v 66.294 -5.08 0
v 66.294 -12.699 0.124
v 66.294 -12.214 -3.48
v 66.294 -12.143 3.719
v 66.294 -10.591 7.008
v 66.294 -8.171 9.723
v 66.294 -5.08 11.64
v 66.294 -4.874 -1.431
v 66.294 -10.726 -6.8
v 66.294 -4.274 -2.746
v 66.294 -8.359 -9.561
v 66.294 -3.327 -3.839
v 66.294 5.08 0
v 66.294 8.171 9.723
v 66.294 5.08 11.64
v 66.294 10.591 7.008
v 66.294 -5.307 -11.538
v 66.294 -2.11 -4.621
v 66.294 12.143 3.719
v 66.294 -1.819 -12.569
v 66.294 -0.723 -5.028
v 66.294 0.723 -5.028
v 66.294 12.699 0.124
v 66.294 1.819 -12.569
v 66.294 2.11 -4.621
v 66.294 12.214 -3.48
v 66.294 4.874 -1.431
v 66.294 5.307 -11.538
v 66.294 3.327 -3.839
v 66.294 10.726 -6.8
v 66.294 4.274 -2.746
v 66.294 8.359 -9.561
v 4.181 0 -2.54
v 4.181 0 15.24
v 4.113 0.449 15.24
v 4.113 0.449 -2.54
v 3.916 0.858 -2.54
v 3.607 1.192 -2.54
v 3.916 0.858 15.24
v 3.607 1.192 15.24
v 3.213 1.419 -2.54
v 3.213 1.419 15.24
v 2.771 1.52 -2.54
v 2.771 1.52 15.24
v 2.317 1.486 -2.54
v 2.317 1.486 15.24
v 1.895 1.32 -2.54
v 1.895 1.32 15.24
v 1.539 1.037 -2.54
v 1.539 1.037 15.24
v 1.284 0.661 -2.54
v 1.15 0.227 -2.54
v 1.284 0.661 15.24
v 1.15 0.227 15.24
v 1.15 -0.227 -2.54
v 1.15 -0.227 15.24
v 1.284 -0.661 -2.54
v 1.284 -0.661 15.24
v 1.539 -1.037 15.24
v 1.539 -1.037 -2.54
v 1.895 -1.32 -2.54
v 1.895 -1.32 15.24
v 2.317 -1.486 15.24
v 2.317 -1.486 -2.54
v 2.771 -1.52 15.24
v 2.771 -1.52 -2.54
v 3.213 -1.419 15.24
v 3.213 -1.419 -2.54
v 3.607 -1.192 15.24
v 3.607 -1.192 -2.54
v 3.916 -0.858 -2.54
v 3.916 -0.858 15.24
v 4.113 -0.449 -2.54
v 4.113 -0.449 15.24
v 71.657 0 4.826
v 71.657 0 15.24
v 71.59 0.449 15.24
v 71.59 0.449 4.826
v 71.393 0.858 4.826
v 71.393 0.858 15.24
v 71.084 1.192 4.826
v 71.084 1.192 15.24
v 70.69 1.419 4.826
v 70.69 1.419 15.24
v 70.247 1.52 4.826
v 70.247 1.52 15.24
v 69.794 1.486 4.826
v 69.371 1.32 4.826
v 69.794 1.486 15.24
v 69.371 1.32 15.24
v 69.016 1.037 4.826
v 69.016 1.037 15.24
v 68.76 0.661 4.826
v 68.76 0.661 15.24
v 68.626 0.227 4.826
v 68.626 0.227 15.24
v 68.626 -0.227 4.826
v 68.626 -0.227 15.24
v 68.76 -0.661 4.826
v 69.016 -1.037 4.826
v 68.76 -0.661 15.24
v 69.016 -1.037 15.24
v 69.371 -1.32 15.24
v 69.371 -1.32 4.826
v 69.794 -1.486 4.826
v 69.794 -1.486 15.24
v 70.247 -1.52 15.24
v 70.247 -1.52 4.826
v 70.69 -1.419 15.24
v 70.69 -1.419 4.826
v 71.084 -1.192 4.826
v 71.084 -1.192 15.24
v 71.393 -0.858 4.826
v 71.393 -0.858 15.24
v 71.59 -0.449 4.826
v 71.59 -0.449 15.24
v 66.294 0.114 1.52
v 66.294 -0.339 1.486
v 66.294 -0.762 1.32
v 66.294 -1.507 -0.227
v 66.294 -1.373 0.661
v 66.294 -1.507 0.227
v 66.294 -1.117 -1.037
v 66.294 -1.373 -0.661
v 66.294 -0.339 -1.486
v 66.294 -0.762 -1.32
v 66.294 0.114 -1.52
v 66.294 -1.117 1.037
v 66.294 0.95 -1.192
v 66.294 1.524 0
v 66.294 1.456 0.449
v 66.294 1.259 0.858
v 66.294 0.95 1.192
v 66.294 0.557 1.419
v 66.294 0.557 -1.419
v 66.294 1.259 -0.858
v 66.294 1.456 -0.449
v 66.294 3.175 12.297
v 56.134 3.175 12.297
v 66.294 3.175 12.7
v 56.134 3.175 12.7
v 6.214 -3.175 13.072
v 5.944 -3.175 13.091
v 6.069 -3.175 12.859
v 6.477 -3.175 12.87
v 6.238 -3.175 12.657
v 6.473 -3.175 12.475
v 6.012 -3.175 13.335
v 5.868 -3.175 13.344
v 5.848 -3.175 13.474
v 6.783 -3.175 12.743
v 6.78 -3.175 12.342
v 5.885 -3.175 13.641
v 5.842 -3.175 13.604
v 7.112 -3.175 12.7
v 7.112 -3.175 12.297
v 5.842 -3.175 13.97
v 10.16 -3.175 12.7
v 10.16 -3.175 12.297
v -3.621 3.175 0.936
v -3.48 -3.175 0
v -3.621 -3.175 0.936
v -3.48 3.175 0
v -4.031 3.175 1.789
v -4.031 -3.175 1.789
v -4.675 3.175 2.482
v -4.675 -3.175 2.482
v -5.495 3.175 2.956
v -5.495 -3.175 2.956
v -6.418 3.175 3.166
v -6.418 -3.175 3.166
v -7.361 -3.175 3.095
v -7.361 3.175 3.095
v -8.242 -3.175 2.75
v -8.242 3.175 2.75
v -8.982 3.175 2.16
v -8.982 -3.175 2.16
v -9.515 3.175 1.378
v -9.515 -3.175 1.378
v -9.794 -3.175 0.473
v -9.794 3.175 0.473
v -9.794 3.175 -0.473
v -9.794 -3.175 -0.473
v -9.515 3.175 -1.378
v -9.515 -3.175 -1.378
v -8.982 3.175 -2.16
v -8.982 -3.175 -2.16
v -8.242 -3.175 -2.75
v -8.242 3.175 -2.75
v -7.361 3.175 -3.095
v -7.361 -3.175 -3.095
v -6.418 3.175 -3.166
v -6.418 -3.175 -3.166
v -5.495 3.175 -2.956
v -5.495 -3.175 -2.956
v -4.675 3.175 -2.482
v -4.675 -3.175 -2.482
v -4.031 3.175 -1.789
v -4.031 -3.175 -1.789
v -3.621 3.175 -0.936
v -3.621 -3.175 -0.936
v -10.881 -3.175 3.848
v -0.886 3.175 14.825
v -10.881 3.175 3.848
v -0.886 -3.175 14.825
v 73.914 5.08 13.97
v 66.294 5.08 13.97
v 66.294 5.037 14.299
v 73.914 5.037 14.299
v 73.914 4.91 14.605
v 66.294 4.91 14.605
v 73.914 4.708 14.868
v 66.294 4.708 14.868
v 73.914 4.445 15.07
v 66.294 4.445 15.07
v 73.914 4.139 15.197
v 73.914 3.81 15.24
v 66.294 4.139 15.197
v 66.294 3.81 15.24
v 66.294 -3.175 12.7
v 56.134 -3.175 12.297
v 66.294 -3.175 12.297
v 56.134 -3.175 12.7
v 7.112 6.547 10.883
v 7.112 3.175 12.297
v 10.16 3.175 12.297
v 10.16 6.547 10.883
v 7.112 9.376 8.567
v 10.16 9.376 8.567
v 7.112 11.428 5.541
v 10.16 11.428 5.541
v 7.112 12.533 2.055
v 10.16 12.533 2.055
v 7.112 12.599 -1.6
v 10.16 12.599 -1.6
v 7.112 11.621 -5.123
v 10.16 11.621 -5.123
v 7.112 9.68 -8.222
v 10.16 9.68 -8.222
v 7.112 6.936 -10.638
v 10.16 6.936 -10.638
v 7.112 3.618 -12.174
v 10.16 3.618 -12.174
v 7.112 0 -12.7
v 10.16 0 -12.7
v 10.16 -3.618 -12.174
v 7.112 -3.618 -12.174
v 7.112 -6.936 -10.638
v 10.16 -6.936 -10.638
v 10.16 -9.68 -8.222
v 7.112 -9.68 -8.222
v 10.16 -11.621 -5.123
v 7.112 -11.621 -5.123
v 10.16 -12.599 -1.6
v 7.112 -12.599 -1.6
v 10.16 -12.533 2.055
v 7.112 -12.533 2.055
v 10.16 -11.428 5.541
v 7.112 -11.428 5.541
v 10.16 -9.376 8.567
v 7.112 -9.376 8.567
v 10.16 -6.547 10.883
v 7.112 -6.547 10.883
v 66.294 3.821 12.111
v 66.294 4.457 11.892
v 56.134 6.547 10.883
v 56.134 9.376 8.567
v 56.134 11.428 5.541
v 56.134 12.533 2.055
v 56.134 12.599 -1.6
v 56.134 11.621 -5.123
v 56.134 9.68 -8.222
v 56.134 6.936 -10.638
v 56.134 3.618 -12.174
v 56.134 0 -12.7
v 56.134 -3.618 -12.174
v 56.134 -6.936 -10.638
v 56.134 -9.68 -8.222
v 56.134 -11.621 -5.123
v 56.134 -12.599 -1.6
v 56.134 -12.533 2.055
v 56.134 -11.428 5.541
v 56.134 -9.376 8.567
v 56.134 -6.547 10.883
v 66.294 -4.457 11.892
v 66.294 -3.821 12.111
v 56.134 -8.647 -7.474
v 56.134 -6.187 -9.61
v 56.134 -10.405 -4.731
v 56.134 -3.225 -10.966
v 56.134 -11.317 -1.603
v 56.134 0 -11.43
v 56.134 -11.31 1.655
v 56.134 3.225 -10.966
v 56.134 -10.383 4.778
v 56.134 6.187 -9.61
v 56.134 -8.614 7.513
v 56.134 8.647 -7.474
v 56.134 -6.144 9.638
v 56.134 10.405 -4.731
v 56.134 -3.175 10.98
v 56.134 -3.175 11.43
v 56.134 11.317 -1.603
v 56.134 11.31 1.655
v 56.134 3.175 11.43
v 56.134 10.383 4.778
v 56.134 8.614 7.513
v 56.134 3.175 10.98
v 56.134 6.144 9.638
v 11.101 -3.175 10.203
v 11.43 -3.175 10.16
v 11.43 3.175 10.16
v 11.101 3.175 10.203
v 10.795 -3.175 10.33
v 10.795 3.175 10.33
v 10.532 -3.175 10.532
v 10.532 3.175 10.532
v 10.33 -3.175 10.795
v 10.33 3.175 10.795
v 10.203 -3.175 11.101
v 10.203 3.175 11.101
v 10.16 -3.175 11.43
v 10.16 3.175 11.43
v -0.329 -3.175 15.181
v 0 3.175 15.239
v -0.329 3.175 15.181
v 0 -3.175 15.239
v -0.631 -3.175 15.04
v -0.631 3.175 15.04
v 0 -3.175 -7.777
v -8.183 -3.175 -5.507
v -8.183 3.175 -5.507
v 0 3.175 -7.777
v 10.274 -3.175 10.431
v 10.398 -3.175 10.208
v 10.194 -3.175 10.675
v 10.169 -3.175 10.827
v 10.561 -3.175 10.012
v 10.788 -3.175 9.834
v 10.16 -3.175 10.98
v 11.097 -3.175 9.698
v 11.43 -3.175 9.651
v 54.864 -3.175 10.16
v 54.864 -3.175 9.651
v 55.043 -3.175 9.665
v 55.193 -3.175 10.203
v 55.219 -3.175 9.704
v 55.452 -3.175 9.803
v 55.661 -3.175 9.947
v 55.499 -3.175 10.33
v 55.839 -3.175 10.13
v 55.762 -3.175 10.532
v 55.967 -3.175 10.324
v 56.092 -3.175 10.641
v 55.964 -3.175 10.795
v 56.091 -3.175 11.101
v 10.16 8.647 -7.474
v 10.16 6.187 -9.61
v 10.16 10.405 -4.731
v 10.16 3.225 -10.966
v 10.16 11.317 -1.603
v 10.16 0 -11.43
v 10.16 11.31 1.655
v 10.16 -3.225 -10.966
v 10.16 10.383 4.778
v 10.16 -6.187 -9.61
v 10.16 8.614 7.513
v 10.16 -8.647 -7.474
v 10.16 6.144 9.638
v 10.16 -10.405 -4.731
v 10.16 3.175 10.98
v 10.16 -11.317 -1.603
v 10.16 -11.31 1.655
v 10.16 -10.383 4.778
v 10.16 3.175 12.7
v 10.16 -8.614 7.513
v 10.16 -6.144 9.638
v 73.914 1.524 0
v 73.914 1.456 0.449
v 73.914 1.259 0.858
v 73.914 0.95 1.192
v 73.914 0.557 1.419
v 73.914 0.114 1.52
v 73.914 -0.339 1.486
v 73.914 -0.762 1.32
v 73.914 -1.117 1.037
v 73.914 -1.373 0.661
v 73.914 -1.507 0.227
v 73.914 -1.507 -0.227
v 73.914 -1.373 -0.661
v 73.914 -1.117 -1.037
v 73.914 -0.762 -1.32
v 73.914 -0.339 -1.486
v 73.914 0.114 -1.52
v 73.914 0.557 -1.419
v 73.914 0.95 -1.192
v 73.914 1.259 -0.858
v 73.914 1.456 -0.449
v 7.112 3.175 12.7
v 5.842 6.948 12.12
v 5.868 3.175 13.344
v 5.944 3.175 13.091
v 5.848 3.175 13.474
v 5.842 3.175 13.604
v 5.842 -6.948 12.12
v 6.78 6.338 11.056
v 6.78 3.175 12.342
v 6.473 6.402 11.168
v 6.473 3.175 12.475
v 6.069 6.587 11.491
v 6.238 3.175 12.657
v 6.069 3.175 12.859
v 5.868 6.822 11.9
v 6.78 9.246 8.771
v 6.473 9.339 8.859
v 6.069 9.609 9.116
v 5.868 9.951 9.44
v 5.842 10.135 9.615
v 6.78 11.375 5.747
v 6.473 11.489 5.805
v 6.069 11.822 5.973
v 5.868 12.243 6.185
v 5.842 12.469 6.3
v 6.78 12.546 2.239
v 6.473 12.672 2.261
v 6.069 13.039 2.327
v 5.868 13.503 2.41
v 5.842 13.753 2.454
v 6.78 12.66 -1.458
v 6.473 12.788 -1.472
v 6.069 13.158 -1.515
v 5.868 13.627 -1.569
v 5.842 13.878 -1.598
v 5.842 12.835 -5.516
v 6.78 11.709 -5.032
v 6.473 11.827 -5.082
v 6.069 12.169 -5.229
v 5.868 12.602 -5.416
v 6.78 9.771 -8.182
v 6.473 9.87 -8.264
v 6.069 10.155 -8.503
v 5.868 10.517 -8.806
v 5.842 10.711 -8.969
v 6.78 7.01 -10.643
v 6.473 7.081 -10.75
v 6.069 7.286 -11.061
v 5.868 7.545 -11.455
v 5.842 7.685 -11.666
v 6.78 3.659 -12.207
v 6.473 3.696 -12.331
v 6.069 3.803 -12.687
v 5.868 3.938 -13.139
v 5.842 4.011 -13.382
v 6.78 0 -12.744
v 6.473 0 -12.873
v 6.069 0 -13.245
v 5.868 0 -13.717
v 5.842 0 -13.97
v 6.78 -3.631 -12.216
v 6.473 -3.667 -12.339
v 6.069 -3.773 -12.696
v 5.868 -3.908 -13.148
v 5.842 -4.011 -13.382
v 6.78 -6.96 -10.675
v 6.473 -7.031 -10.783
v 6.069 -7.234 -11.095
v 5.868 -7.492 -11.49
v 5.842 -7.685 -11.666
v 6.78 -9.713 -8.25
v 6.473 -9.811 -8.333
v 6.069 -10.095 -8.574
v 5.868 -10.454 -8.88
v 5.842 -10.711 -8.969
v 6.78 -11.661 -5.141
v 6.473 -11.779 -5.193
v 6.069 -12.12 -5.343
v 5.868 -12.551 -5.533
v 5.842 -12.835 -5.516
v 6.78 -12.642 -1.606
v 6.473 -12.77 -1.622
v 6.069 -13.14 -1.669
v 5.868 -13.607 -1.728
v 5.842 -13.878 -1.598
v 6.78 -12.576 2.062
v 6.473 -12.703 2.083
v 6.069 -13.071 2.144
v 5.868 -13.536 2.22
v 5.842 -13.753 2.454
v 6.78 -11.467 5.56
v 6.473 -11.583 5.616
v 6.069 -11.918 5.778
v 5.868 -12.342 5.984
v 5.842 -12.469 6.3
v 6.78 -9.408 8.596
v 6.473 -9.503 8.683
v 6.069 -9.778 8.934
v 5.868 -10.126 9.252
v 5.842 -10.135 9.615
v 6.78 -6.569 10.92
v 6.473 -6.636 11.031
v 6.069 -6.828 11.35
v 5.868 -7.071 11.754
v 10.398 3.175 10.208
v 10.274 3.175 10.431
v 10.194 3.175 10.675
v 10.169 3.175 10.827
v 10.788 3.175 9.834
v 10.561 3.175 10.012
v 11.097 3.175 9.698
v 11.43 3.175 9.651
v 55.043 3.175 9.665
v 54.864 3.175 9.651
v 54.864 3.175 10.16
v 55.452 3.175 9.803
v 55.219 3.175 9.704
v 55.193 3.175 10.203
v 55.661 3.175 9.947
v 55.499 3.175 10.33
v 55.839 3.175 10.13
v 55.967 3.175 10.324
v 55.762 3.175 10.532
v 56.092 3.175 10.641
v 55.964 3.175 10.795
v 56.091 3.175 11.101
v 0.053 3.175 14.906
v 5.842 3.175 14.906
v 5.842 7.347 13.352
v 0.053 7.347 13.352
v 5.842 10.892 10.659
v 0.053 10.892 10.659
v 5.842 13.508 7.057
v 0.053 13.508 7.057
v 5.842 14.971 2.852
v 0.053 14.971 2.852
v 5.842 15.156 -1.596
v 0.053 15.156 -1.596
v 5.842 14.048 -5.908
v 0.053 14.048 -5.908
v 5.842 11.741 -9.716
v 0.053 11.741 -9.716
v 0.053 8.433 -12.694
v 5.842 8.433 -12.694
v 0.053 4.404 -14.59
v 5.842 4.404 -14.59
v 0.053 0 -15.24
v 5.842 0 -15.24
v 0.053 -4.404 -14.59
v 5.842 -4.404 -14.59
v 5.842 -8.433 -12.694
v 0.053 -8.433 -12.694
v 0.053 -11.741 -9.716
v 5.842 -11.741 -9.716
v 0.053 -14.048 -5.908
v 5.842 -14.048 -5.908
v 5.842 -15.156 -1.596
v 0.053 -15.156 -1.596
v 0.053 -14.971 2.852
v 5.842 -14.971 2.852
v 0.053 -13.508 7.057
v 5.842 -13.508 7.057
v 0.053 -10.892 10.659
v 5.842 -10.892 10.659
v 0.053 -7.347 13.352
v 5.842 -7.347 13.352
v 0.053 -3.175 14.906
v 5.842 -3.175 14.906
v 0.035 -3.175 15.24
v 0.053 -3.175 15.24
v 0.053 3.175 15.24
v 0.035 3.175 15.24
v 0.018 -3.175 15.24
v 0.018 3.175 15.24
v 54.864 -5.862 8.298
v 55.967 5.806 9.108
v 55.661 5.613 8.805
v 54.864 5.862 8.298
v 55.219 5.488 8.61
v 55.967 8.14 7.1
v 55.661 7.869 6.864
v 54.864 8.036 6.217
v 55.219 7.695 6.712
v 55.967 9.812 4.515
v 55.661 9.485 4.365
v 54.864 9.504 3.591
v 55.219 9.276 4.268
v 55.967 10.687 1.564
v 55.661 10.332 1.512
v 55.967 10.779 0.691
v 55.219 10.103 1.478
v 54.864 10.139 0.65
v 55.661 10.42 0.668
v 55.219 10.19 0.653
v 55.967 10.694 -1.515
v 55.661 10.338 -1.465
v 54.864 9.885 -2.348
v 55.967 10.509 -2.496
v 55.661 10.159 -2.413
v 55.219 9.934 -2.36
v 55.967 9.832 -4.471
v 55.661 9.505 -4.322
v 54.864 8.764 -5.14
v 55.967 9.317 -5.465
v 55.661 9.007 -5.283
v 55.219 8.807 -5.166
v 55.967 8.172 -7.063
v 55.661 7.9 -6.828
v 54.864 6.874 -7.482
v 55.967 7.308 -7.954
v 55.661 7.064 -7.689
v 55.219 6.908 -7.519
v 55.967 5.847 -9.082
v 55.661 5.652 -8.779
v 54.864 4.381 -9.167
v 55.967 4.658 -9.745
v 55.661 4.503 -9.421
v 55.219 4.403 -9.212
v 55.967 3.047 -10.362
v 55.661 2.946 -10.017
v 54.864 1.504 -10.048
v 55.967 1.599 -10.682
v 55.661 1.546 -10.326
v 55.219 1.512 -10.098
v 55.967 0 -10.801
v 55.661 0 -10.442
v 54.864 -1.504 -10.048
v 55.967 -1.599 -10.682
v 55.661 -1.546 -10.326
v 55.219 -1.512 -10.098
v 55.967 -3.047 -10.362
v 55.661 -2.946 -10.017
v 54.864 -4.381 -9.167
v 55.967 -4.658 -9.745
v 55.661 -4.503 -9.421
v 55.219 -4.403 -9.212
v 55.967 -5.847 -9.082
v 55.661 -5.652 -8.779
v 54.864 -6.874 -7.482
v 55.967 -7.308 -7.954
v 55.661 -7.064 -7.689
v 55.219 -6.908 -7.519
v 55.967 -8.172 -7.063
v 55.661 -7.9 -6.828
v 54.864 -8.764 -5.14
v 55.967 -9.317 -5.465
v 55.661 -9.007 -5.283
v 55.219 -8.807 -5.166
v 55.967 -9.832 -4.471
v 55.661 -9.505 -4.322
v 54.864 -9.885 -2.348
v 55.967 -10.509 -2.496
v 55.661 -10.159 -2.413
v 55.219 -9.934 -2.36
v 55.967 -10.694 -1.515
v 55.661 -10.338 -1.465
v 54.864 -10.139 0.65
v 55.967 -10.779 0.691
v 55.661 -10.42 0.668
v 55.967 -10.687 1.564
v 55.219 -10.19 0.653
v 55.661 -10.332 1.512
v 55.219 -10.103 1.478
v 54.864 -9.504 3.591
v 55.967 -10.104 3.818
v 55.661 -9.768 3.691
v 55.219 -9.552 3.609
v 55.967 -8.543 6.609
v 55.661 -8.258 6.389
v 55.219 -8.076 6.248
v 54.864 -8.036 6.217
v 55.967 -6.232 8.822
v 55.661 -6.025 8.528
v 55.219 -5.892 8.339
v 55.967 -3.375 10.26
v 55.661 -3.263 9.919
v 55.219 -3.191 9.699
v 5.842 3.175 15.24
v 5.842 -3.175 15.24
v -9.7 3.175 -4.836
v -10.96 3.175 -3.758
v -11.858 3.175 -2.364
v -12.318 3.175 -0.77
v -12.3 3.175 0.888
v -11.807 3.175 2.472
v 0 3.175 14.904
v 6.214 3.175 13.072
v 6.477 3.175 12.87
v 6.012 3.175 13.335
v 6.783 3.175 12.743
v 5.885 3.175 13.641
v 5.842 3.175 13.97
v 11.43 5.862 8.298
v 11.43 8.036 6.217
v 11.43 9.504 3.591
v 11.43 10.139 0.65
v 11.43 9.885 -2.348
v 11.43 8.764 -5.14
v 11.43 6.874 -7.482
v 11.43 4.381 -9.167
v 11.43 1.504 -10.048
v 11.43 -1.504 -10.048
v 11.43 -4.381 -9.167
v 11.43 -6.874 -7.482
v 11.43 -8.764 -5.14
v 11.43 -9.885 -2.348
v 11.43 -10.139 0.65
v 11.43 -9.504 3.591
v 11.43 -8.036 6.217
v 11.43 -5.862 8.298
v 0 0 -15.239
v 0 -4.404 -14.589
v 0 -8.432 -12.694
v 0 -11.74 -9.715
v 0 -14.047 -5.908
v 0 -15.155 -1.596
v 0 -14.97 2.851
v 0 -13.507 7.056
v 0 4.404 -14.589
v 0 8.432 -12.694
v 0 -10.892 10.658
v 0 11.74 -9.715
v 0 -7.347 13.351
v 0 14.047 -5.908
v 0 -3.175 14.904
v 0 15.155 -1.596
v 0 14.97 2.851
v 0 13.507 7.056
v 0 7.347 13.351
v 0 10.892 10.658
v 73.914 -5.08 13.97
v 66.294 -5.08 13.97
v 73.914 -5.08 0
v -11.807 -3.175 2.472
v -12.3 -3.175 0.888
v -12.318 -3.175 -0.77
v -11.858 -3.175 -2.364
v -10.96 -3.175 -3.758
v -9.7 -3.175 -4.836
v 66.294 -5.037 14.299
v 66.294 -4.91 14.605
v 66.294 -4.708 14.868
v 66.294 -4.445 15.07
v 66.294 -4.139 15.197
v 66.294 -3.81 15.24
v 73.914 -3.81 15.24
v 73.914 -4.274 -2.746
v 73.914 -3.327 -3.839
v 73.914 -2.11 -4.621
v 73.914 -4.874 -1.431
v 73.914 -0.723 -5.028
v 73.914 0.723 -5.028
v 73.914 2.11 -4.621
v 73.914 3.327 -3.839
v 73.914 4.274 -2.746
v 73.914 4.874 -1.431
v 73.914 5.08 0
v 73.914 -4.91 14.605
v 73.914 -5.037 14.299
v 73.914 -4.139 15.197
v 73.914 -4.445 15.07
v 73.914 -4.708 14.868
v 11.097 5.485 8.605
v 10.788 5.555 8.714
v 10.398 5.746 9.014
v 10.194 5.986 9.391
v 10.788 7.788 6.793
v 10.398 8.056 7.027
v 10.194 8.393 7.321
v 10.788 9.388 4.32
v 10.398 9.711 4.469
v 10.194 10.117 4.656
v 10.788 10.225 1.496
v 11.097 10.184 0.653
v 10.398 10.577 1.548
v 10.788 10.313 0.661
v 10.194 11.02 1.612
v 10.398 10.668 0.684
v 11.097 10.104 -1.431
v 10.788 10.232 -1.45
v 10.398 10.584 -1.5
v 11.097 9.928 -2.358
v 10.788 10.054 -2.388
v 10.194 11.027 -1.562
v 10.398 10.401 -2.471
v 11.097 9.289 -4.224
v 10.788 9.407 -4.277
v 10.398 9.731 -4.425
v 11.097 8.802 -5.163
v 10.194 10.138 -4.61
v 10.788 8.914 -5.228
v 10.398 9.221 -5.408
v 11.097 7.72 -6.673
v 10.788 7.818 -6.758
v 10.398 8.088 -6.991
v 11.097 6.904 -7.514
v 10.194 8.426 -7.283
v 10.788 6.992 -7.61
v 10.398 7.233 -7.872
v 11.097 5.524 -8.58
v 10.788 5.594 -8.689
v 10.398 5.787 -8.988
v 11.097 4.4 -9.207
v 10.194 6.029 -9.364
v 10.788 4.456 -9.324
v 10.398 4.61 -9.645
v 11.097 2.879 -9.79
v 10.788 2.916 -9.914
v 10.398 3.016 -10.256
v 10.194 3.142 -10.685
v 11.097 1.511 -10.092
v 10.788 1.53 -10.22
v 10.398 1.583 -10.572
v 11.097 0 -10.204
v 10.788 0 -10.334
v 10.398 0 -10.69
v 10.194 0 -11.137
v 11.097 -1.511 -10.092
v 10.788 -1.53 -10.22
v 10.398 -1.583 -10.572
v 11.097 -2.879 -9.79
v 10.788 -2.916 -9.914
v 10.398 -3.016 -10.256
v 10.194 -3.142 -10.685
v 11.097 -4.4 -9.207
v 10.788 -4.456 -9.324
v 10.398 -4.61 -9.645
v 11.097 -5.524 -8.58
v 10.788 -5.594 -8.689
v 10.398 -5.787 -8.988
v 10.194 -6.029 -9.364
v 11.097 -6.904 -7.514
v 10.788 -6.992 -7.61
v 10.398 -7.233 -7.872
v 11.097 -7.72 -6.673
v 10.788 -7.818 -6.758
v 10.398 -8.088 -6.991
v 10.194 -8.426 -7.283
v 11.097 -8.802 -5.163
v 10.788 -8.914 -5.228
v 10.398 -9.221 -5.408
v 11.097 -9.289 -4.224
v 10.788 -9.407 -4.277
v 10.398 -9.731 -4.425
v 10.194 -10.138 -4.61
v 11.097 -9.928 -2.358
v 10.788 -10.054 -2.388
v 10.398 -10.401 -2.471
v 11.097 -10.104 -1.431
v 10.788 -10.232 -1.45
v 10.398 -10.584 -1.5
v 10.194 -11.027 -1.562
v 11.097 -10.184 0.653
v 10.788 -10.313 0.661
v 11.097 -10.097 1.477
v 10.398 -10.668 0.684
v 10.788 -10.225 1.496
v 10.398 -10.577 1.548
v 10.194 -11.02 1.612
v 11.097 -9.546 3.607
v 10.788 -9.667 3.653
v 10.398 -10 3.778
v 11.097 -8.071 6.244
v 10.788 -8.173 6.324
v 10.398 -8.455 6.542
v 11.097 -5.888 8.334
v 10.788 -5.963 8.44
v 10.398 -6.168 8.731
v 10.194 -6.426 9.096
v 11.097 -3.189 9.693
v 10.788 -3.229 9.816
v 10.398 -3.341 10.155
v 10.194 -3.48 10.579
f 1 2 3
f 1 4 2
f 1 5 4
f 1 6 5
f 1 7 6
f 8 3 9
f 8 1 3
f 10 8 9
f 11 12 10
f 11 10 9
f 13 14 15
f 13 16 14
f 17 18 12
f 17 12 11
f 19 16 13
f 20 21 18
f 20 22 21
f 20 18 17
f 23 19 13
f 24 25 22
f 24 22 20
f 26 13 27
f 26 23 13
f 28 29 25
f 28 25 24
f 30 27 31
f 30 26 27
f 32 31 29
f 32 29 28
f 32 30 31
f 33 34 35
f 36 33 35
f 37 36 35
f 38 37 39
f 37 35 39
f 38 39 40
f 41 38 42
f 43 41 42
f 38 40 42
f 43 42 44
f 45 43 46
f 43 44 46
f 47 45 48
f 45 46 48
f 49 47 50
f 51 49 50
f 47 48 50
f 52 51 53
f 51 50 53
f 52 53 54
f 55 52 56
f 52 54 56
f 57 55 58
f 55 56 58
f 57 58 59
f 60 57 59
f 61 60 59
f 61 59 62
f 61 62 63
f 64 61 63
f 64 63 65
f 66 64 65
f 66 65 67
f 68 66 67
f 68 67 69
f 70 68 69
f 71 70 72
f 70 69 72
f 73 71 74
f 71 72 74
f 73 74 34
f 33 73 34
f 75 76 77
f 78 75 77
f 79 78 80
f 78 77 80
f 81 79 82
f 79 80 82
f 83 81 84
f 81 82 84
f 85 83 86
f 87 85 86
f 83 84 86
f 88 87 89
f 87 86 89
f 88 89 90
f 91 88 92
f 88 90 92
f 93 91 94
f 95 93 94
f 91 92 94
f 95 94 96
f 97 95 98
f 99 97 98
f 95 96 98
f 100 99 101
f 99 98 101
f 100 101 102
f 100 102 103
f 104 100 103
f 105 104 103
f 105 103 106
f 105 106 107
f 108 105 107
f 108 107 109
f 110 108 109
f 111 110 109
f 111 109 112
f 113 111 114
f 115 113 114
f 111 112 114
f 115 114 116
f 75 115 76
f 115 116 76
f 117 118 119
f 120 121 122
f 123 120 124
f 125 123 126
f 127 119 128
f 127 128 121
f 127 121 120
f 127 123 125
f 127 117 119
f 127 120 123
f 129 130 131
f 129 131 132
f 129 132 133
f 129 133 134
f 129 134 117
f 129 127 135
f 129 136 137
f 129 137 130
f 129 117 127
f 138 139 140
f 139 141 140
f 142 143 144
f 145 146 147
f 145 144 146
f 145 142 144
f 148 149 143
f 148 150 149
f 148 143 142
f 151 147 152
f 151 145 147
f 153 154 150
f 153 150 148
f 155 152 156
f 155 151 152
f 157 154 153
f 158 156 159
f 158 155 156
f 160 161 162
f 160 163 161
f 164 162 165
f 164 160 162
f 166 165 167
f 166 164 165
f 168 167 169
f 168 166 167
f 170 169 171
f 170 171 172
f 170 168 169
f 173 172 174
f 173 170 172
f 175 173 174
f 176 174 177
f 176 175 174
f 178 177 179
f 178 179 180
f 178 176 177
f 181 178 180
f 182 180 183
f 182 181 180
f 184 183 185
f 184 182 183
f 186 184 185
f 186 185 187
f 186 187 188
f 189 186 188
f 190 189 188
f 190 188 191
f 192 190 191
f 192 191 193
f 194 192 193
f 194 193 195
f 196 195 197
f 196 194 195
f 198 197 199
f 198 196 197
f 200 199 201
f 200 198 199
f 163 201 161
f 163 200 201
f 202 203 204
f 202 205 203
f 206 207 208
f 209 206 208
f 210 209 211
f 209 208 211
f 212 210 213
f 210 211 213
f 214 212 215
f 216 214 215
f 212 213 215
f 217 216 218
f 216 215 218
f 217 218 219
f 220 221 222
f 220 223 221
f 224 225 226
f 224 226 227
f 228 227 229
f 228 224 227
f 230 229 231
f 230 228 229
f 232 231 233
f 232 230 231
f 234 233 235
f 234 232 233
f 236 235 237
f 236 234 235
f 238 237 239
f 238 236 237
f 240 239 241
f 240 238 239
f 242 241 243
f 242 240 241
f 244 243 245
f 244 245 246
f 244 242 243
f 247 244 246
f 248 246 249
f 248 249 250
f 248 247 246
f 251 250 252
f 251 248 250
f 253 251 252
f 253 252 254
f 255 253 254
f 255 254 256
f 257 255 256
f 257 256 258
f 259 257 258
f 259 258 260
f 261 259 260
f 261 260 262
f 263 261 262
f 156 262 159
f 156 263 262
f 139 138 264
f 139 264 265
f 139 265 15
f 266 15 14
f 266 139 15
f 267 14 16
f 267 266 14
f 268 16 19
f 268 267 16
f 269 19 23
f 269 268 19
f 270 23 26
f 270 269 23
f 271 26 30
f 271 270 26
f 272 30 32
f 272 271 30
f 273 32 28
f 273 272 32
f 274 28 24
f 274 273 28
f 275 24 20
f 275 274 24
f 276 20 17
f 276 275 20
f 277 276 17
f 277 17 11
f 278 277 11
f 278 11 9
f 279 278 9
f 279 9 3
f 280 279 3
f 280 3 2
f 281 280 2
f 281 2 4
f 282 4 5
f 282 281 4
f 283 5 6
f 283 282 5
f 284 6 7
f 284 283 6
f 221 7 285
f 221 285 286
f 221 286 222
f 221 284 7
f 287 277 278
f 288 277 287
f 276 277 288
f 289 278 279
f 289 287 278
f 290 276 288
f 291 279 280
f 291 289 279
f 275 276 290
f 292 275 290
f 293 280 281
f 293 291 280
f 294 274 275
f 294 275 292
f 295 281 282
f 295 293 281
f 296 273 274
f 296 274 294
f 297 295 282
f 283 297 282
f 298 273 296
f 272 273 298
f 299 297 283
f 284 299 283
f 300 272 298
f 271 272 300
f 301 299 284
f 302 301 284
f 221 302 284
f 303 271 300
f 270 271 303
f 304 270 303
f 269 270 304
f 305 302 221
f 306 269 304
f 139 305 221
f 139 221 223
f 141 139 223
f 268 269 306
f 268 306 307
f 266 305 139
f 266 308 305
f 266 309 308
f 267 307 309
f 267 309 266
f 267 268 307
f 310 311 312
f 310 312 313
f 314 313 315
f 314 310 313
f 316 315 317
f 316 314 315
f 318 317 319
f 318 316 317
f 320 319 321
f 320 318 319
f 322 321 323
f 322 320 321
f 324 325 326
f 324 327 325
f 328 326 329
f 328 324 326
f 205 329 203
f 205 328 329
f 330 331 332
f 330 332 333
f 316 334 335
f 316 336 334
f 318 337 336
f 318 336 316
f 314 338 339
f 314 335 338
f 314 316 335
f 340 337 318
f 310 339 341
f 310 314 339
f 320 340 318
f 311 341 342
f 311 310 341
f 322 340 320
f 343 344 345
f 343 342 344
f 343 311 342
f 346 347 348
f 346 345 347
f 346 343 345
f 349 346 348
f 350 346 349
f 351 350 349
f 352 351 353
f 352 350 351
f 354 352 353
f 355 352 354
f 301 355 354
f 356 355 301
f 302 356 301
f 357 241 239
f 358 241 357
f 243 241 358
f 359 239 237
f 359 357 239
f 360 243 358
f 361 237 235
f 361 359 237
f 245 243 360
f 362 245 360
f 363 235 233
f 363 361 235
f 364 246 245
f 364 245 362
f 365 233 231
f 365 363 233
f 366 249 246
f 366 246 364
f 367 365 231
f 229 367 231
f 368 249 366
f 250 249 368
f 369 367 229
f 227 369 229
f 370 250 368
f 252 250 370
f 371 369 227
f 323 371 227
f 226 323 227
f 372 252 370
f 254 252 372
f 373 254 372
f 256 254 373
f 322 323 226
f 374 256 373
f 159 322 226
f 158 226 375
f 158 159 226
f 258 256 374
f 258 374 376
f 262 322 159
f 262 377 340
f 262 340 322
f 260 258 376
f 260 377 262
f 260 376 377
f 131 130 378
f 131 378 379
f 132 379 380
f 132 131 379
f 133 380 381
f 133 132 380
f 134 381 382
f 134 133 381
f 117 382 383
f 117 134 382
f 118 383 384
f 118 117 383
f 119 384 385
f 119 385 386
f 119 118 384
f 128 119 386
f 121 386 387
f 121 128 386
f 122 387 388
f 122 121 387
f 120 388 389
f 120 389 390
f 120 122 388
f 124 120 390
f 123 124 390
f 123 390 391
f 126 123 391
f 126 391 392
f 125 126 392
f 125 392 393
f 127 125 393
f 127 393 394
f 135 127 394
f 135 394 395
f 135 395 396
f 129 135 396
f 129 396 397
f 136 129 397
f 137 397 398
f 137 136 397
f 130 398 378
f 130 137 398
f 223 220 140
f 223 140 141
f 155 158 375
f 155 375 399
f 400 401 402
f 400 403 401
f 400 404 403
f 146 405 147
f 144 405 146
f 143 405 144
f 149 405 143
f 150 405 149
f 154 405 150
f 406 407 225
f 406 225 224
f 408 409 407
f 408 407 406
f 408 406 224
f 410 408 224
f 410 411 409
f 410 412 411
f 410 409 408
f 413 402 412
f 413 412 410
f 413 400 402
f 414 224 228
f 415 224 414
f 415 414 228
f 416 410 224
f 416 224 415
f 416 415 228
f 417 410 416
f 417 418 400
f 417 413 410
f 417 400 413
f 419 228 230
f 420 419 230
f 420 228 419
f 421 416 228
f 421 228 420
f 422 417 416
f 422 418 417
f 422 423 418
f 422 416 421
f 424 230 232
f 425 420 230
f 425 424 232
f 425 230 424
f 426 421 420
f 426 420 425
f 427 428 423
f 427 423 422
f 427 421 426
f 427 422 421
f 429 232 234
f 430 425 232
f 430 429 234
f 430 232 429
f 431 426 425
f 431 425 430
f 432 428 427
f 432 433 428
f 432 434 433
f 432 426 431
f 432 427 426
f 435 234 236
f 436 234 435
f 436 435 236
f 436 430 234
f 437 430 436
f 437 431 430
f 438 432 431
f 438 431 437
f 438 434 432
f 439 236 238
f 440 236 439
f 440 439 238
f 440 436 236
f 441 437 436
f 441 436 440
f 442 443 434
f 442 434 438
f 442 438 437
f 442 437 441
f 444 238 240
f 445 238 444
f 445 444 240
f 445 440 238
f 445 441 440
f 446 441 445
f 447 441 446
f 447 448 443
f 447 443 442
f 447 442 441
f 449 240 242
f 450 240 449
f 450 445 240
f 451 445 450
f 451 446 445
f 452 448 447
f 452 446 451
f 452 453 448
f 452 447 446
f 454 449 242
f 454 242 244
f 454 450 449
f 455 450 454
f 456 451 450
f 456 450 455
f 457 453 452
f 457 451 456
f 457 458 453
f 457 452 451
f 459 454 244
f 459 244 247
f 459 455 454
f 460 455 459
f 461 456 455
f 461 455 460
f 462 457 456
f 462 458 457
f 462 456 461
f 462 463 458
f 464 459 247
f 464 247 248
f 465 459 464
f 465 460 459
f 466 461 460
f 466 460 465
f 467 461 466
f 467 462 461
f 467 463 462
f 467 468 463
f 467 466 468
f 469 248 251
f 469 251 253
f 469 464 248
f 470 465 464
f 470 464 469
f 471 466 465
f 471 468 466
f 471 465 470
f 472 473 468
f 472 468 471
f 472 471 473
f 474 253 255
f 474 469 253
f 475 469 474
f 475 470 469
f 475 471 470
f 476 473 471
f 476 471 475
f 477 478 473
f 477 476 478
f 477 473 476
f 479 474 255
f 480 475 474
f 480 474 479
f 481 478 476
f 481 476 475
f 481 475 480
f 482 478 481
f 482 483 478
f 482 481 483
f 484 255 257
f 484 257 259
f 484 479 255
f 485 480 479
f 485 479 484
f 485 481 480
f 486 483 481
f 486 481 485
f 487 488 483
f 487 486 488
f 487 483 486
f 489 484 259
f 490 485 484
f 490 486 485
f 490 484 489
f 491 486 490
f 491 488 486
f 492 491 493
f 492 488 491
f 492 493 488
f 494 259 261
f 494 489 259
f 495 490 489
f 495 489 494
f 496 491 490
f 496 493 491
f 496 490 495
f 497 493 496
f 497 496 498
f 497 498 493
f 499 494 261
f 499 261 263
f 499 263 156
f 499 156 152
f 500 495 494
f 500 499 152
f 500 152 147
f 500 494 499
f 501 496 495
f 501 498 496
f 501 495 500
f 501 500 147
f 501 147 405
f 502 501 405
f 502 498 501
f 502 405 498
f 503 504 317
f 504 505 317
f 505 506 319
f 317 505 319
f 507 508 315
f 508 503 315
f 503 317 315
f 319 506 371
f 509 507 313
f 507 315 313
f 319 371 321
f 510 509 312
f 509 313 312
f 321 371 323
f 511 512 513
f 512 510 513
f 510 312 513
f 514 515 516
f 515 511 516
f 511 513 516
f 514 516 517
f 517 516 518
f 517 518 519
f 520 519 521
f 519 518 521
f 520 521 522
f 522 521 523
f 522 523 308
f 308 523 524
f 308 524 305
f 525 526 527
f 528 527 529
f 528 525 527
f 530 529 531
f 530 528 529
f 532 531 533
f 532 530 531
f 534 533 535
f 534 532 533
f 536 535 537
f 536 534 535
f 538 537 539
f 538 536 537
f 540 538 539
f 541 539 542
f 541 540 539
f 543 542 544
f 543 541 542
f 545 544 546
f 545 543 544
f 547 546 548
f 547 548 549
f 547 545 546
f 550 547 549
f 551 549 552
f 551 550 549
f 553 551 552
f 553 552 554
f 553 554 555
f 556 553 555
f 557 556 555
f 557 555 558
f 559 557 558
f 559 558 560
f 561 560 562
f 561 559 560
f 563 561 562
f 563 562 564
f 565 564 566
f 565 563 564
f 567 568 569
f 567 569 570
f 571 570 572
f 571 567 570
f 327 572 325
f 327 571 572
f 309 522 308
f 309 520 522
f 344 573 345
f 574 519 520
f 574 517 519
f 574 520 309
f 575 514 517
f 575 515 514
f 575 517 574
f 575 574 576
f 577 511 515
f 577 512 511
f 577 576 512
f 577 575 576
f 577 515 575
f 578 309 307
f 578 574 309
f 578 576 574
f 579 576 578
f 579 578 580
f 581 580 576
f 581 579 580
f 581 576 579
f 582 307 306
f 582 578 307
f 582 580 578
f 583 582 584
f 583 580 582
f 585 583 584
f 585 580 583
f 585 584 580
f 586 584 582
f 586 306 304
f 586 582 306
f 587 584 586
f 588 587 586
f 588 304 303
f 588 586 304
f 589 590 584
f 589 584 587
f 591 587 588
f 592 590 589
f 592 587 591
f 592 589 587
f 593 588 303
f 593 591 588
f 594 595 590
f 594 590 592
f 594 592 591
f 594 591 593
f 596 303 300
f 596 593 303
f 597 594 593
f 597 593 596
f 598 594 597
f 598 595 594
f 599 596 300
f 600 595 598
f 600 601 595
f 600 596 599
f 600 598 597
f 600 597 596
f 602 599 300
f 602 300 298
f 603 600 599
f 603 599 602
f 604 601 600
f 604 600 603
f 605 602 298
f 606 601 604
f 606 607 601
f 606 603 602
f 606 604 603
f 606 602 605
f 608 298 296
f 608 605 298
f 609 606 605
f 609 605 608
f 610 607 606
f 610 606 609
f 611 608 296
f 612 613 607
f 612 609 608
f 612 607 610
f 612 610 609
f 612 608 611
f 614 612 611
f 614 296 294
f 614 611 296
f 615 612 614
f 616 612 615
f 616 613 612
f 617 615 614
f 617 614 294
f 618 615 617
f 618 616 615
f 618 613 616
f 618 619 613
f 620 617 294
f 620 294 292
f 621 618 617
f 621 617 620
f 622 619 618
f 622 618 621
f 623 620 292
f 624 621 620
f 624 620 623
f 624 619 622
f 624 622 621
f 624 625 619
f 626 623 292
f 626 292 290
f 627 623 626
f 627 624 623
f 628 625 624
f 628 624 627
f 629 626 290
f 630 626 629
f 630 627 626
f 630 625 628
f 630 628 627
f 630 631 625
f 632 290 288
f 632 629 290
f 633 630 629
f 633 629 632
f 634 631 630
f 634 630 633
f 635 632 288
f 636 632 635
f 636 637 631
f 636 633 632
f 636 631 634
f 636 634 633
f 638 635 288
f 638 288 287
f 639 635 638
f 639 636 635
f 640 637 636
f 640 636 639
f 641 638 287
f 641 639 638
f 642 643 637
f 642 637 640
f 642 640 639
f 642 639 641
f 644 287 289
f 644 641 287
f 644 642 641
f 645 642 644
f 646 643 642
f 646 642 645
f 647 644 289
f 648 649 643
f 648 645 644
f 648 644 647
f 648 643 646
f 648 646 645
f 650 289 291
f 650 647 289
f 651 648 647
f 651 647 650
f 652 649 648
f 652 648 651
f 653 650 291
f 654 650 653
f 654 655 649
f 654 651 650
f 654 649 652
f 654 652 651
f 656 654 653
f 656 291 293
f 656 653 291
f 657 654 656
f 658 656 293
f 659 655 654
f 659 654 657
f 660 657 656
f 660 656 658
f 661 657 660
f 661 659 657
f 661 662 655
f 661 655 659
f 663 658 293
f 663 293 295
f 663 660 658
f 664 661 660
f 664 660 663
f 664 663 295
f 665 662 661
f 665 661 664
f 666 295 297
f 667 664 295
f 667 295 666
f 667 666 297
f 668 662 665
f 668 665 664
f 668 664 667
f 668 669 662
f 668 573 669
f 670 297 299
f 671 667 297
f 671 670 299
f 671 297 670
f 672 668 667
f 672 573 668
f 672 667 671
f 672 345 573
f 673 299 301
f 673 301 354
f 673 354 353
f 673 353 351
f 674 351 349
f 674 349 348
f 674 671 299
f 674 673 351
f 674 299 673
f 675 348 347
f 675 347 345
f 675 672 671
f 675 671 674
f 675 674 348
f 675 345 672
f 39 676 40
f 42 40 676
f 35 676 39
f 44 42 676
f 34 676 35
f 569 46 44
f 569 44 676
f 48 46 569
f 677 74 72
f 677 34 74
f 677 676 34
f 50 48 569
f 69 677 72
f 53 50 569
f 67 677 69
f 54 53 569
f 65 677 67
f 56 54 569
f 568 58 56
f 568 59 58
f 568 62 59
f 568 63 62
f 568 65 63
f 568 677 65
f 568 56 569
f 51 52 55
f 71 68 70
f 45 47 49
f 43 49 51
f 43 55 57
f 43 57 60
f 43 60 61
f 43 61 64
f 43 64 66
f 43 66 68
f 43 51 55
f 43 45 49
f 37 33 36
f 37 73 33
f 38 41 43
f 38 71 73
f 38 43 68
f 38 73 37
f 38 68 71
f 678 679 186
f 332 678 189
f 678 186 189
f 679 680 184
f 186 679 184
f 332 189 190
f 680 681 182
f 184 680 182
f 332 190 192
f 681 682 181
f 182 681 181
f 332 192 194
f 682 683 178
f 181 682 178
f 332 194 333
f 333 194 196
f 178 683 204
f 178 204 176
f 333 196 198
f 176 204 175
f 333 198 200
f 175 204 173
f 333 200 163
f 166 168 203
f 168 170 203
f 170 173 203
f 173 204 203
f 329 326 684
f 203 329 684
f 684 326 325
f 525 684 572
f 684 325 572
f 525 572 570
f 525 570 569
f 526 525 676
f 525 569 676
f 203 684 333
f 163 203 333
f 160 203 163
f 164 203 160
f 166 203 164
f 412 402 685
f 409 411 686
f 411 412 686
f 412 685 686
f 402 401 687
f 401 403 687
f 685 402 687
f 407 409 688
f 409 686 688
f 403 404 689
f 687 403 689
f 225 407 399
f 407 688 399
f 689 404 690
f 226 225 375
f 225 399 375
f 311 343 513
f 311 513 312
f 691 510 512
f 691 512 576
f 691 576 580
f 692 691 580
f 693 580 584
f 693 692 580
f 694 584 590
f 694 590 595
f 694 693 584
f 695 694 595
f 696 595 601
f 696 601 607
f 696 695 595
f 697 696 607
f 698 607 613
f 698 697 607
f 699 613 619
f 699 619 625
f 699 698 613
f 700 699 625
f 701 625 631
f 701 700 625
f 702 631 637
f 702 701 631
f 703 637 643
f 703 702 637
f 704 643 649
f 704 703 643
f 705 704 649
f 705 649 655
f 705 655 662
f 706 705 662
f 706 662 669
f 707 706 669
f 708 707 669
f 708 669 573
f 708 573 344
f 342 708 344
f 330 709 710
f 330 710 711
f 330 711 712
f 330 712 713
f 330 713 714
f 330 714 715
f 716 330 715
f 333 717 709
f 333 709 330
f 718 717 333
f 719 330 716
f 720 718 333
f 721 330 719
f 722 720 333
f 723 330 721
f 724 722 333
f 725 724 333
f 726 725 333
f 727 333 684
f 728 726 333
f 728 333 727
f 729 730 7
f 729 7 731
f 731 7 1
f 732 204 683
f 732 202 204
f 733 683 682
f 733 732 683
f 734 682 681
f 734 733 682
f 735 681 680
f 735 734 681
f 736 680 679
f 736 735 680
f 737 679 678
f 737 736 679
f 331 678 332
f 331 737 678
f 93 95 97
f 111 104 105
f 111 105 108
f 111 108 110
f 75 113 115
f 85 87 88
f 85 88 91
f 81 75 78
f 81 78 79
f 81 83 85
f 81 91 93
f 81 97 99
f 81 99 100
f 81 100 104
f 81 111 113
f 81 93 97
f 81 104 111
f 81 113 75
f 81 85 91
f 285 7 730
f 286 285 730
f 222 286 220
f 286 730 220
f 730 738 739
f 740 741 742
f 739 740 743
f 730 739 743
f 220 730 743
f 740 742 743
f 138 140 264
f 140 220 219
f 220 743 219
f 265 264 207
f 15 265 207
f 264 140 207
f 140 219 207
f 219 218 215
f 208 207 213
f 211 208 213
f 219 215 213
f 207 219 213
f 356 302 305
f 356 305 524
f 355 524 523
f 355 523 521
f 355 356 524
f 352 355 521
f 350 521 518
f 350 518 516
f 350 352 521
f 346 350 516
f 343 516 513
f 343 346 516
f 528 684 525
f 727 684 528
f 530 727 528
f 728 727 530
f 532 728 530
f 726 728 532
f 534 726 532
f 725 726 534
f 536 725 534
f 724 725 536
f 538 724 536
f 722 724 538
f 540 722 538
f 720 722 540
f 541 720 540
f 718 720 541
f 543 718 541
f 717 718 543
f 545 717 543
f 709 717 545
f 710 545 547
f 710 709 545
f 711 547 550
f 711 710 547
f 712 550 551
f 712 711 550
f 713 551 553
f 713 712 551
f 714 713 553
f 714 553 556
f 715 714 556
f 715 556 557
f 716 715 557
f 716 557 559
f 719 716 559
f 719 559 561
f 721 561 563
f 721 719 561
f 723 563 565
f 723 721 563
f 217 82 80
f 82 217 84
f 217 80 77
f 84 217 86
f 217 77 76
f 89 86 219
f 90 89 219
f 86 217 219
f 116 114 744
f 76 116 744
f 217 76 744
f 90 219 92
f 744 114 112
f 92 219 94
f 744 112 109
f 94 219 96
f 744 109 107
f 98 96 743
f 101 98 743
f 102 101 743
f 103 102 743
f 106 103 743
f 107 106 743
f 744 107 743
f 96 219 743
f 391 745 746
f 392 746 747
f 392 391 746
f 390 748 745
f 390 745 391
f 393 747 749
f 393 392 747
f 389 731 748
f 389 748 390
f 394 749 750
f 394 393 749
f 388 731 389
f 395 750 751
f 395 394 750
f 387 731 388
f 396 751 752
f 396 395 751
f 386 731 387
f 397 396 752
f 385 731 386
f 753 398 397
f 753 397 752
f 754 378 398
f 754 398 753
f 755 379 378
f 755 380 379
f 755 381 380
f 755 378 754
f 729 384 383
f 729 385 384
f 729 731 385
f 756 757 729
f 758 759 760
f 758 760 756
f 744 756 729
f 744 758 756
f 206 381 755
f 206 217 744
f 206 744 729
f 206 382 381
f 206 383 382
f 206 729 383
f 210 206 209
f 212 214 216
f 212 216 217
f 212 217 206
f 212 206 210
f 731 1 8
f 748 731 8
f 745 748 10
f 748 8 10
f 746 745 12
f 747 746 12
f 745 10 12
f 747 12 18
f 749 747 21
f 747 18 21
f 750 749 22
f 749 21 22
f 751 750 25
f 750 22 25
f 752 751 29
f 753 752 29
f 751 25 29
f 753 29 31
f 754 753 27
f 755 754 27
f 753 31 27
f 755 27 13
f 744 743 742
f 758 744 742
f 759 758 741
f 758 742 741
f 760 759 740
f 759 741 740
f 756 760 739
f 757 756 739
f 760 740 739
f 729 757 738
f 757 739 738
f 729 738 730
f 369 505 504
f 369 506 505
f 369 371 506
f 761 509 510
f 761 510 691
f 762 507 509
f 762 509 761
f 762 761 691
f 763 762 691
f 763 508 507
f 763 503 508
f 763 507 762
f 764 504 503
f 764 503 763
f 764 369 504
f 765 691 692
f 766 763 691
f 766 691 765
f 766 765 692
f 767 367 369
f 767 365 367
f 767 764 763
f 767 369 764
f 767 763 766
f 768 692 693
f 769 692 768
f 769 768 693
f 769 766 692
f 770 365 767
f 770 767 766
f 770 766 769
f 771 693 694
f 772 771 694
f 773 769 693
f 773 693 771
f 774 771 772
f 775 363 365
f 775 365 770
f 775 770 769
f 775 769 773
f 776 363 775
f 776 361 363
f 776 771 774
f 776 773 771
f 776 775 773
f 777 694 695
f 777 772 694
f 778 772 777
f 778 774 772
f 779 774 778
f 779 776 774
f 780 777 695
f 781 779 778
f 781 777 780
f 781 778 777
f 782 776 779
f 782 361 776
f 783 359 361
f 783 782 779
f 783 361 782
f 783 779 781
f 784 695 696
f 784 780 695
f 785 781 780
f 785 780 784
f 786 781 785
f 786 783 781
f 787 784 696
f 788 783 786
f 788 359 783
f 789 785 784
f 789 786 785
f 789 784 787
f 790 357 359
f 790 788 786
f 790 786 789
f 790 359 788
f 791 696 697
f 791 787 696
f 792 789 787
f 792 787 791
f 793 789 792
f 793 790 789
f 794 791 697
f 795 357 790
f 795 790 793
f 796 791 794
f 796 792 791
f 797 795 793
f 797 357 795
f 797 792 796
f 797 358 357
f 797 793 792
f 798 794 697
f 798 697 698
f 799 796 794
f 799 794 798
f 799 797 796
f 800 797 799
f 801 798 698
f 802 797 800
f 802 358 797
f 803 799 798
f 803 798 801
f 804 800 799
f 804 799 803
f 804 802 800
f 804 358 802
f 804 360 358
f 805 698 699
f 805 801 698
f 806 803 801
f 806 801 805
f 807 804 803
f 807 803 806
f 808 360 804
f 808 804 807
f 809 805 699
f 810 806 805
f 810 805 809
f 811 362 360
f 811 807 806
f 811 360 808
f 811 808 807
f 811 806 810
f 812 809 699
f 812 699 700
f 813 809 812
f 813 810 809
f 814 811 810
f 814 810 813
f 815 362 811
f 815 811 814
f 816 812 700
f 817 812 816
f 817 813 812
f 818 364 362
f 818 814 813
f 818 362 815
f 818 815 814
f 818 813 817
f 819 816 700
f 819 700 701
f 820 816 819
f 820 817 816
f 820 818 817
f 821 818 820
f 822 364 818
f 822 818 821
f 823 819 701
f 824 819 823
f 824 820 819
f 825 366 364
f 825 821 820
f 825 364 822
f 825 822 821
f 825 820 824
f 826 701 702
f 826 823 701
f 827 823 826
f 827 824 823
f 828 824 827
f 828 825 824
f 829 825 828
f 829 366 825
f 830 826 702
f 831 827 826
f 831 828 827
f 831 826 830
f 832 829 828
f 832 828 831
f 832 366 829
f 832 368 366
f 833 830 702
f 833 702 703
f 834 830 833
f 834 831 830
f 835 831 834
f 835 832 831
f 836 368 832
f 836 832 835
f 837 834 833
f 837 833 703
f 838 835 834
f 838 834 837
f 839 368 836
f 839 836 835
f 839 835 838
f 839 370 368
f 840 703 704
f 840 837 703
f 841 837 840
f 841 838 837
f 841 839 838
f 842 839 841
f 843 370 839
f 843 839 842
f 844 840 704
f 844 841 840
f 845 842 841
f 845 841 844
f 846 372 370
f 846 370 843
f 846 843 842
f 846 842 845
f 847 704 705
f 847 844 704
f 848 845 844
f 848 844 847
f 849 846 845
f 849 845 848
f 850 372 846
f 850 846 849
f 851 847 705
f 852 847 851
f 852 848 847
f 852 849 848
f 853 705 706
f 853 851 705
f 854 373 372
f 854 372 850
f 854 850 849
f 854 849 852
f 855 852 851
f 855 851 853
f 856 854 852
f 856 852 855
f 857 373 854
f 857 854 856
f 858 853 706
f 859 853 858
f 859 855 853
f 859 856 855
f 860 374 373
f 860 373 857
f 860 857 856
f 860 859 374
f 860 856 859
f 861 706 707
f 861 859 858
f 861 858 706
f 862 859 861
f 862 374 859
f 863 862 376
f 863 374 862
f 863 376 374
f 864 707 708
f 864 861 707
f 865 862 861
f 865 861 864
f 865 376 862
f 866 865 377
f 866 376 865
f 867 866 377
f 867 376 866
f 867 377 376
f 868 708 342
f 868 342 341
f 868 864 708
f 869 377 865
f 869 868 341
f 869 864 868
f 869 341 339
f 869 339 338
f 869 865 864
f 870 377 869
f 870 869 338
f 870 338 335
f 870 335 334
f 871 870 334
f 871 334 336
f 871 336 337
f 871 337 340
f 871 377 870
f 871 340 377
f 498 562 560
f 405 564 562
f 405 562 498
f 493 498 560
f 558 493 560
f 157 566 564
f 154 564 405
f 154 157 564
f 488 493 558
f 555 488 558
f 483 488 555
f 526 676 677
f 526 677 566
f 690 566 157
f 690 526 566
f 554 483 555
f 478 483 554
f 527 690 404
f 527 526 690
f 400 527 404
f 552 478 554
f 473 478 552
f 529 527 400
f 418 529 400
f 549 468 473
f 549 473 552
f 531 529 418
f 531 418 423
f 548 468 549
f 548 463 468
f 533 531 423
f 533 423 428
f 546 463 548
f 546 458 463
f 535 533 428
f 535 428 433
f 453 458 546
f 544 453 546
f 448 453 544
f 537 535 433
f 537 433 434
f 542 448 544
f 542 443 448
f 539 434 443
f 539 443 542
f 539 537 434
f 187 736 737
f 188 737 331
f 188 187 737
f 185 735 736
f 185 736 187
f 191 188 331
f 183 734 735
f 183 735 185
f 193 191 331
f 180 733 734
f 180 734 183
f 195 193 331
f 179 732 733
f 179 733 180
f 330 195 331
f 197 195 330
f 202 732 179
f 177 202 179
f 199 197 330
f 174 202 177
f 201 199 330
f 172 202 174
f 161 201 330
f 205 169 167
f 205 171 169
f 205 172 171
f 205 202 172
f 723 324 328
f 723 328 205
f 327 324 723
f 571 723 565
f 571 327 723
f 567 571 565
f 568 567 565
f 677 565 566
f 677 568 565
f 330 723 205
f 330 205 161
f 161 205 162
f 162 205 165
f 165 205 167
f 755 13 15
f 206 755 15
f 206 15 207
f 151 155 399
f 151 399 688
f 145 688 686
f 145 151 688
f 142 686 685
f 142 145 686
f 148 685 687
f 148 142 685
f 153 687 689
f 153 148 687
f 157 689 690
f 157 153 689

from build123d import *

# Parameters (mm, degrees)
F0_R     = 3.175
F2_DEPTH = 3.175
F3_R     = 1.524
F4_DEPTH = 7.62
F5_R     = 1.524
F6_DEPTH = 17.78
F7_R     = 1.524
F8_DEPTH = 10.414


with BuildPart() as f1:
    # F0 (on Front) → F1 (revolve)
    with BuildSketch(Plane.XZ):
        with BuildLine():
            Line((0, 15.238884), (0, 0))
            Line((0, 0), (7.112, 0))
            Line((7.112, 0), (66.294, 0))
            Line((66.294, 0), (66.294, 12.7))
            Line((66.294, 12.7), (56.134, 12.7))
            Line((56.134, 12.7), (56.134, 11.43))
            ThreePointArc((56.134, 11.43), (55.762026, 10.531974), (54.864, 10.16))
            Line((54.864, 10.16), (11.43, 10.16))
            ThreePointArc((11.43, 10.16), (10.531974, 10.531974), (10.16, 11.43))
            Line((10.16, 11.43), (10.16, 12.7))
            Line((10.16, 12.7), (7.112, 12.7))
            ThreePointArc((7.112, 12.7), (6.213974, 13.071974), (5.842, 13.97))
            Line((5.842, 13.97), (5.842, 15.24))
            Line((5.842, 15.24), (0.053232, 15.24))
            ThreePointArc((0.053232, 15.24), (0.02661, 15.239721), (0, 15.238884))
        make_face()
    revolve(axis=Axis((36.703, 0, 0), (-1, 0, 0)))

    # F0 (on Front) → F2 (join, symmetric)
    with BuildSketch(Plane.XZ):
        with BuildLine():
            Line((-0.9398, 0), (0, 0))
            Line((0, 0), (0, 15.238884))
            ThreePointArc((0, 15.238884), (-0.484346, 15.120613), (-0.885841, 14.82501))
            Line((-0.885841, 14.82501), (-10.88063, 3.847543))
            ThreePointArc((-10.88063, 3.847543), (-4.591961, 5.329721), (-0.9398, 0))
        make_face()
        with BuildLine():
            Line((0, 15.238884), (0, 0))
            Line((0, 0), (7.112, 0))
            Line((7.112, 0), (66.294, 0))
            Line((66.294, 0), (66.294, 12.7))
            Line((66.294, 12.7), (56.134, 12.7))
            Line((56.134, 12.7), (56.134, 11.43))
            ThreePointArc((56.134, 11.43), (55.762026, 10.531974), (54.864, 10.16))
            Line((54.864, 10.16), (11.43, 10.16))
            ThreePointArc((11.43, 10.16), (10.531974, 10.531974), (10.16, 11.43))
            Line((10.16, 11.43), (10.16, 12.7))
            Line((10.16, 12.7), (7.112, 12.7))
            ThreePointArc((7.112, 12.7), (6.213974, 13.071974), (5.842, 13.97))
            Line((5.842, 13.97), (5.842, 15.24))
            Line((5.842, 15.24), (0.053232, 15.24))
            ThreePointArc((0.053232, 15.24), (0.02661, 15.239721), (0, 15.238884))
        make_face()
        with BuildLine():
            Line((7.112, 0), (0, 0))
            Line((0, 0), (-0.9398, 0))
            ThreePointArc((-0.9398, 0), (-3.195791, -4.549339), (-8.182663, -5.506983))
            Line((-8.182663, -5.506983), (4.232475, -8.951452))
            ThreePointArc((4.232475, -8.951452), (5.340669, -8.738642), (5.842, -7.727678))
            Line((5.842, -7.727678), (5.842, -1.27))
            ThreePointArc((5.842, -1.27), (6.213974, -0.371974), (7.112, 0))
        make_face()
        with BuildLine():
            ThreePointArc((-8.182663, -5.506983), (-3.195791, -4.549339), (-0.9398, 0))
            ThreePointArc((-0.9398, 0), (-4.591961, 5.329721), (-10.88063, 3.847543))
            ThreePointArc((-10.88063, 3.847543), (-12.145978, -1.583727), (-8.182663, -5.506983))
        make_face()
        with Locations((-6.6548, 0)):
            Circle(F0_R, mode=Mode.SUBTRACT)
    extrude(amount=F2_DEPTH, both=True)

    # F3 (on face) → F4 (join)
    with BuildSketch(Plane.YZ.offset(66.294)):
        with BuildLine():
            ThreePointArc((-5.08, 0), (0, -5.08), (5.08, 0))
            ThreePointArc((5.08, 0), (0, 5.08), (-5.08, 0))
        make_face()
        Circle(F3_R, mode=Mode.SUBTRACT)
        with BuildLine():
            ThreePointArc((-5.08, 0), (0, 5.08), (5.08, 0))
            Line((5.08, 0), (5.08, 13.97))
            ThreePointArc((5.08, 13.97), (4.708026, 14.868026), (3.81, 15.24))
            Line((3.81, 15.24), (-3.81, 15.24))
            ThreePointArc((-3.81, 15.24), (-4.708026, 14.868026), (-5.08, 13.97))
            Line((-5.08, 13.97), (-5.08, 0))
        make_face()
    extrude(amount=F4_DEPTH)

    # F5 (on face) → F6 (cut)
    with BuildSketch(Plane.XY.offset(15.24)):
        with Locations((2.65662, 0)):
            Circle(F5_R)
    extrude(amount=-F6_DEPTH, mode=Mode.SUBTRACT)

    # F7 (on face) → F8 (cut)
    with BuildSketch(Plane.XY.offset(15.24)):
        with Locations((70.133381, 0)):
            Circle(F7_R)
    extrude(amount=-F8_DEPTH, mode=Mode.SUBTRACT)


solid = f1.part
